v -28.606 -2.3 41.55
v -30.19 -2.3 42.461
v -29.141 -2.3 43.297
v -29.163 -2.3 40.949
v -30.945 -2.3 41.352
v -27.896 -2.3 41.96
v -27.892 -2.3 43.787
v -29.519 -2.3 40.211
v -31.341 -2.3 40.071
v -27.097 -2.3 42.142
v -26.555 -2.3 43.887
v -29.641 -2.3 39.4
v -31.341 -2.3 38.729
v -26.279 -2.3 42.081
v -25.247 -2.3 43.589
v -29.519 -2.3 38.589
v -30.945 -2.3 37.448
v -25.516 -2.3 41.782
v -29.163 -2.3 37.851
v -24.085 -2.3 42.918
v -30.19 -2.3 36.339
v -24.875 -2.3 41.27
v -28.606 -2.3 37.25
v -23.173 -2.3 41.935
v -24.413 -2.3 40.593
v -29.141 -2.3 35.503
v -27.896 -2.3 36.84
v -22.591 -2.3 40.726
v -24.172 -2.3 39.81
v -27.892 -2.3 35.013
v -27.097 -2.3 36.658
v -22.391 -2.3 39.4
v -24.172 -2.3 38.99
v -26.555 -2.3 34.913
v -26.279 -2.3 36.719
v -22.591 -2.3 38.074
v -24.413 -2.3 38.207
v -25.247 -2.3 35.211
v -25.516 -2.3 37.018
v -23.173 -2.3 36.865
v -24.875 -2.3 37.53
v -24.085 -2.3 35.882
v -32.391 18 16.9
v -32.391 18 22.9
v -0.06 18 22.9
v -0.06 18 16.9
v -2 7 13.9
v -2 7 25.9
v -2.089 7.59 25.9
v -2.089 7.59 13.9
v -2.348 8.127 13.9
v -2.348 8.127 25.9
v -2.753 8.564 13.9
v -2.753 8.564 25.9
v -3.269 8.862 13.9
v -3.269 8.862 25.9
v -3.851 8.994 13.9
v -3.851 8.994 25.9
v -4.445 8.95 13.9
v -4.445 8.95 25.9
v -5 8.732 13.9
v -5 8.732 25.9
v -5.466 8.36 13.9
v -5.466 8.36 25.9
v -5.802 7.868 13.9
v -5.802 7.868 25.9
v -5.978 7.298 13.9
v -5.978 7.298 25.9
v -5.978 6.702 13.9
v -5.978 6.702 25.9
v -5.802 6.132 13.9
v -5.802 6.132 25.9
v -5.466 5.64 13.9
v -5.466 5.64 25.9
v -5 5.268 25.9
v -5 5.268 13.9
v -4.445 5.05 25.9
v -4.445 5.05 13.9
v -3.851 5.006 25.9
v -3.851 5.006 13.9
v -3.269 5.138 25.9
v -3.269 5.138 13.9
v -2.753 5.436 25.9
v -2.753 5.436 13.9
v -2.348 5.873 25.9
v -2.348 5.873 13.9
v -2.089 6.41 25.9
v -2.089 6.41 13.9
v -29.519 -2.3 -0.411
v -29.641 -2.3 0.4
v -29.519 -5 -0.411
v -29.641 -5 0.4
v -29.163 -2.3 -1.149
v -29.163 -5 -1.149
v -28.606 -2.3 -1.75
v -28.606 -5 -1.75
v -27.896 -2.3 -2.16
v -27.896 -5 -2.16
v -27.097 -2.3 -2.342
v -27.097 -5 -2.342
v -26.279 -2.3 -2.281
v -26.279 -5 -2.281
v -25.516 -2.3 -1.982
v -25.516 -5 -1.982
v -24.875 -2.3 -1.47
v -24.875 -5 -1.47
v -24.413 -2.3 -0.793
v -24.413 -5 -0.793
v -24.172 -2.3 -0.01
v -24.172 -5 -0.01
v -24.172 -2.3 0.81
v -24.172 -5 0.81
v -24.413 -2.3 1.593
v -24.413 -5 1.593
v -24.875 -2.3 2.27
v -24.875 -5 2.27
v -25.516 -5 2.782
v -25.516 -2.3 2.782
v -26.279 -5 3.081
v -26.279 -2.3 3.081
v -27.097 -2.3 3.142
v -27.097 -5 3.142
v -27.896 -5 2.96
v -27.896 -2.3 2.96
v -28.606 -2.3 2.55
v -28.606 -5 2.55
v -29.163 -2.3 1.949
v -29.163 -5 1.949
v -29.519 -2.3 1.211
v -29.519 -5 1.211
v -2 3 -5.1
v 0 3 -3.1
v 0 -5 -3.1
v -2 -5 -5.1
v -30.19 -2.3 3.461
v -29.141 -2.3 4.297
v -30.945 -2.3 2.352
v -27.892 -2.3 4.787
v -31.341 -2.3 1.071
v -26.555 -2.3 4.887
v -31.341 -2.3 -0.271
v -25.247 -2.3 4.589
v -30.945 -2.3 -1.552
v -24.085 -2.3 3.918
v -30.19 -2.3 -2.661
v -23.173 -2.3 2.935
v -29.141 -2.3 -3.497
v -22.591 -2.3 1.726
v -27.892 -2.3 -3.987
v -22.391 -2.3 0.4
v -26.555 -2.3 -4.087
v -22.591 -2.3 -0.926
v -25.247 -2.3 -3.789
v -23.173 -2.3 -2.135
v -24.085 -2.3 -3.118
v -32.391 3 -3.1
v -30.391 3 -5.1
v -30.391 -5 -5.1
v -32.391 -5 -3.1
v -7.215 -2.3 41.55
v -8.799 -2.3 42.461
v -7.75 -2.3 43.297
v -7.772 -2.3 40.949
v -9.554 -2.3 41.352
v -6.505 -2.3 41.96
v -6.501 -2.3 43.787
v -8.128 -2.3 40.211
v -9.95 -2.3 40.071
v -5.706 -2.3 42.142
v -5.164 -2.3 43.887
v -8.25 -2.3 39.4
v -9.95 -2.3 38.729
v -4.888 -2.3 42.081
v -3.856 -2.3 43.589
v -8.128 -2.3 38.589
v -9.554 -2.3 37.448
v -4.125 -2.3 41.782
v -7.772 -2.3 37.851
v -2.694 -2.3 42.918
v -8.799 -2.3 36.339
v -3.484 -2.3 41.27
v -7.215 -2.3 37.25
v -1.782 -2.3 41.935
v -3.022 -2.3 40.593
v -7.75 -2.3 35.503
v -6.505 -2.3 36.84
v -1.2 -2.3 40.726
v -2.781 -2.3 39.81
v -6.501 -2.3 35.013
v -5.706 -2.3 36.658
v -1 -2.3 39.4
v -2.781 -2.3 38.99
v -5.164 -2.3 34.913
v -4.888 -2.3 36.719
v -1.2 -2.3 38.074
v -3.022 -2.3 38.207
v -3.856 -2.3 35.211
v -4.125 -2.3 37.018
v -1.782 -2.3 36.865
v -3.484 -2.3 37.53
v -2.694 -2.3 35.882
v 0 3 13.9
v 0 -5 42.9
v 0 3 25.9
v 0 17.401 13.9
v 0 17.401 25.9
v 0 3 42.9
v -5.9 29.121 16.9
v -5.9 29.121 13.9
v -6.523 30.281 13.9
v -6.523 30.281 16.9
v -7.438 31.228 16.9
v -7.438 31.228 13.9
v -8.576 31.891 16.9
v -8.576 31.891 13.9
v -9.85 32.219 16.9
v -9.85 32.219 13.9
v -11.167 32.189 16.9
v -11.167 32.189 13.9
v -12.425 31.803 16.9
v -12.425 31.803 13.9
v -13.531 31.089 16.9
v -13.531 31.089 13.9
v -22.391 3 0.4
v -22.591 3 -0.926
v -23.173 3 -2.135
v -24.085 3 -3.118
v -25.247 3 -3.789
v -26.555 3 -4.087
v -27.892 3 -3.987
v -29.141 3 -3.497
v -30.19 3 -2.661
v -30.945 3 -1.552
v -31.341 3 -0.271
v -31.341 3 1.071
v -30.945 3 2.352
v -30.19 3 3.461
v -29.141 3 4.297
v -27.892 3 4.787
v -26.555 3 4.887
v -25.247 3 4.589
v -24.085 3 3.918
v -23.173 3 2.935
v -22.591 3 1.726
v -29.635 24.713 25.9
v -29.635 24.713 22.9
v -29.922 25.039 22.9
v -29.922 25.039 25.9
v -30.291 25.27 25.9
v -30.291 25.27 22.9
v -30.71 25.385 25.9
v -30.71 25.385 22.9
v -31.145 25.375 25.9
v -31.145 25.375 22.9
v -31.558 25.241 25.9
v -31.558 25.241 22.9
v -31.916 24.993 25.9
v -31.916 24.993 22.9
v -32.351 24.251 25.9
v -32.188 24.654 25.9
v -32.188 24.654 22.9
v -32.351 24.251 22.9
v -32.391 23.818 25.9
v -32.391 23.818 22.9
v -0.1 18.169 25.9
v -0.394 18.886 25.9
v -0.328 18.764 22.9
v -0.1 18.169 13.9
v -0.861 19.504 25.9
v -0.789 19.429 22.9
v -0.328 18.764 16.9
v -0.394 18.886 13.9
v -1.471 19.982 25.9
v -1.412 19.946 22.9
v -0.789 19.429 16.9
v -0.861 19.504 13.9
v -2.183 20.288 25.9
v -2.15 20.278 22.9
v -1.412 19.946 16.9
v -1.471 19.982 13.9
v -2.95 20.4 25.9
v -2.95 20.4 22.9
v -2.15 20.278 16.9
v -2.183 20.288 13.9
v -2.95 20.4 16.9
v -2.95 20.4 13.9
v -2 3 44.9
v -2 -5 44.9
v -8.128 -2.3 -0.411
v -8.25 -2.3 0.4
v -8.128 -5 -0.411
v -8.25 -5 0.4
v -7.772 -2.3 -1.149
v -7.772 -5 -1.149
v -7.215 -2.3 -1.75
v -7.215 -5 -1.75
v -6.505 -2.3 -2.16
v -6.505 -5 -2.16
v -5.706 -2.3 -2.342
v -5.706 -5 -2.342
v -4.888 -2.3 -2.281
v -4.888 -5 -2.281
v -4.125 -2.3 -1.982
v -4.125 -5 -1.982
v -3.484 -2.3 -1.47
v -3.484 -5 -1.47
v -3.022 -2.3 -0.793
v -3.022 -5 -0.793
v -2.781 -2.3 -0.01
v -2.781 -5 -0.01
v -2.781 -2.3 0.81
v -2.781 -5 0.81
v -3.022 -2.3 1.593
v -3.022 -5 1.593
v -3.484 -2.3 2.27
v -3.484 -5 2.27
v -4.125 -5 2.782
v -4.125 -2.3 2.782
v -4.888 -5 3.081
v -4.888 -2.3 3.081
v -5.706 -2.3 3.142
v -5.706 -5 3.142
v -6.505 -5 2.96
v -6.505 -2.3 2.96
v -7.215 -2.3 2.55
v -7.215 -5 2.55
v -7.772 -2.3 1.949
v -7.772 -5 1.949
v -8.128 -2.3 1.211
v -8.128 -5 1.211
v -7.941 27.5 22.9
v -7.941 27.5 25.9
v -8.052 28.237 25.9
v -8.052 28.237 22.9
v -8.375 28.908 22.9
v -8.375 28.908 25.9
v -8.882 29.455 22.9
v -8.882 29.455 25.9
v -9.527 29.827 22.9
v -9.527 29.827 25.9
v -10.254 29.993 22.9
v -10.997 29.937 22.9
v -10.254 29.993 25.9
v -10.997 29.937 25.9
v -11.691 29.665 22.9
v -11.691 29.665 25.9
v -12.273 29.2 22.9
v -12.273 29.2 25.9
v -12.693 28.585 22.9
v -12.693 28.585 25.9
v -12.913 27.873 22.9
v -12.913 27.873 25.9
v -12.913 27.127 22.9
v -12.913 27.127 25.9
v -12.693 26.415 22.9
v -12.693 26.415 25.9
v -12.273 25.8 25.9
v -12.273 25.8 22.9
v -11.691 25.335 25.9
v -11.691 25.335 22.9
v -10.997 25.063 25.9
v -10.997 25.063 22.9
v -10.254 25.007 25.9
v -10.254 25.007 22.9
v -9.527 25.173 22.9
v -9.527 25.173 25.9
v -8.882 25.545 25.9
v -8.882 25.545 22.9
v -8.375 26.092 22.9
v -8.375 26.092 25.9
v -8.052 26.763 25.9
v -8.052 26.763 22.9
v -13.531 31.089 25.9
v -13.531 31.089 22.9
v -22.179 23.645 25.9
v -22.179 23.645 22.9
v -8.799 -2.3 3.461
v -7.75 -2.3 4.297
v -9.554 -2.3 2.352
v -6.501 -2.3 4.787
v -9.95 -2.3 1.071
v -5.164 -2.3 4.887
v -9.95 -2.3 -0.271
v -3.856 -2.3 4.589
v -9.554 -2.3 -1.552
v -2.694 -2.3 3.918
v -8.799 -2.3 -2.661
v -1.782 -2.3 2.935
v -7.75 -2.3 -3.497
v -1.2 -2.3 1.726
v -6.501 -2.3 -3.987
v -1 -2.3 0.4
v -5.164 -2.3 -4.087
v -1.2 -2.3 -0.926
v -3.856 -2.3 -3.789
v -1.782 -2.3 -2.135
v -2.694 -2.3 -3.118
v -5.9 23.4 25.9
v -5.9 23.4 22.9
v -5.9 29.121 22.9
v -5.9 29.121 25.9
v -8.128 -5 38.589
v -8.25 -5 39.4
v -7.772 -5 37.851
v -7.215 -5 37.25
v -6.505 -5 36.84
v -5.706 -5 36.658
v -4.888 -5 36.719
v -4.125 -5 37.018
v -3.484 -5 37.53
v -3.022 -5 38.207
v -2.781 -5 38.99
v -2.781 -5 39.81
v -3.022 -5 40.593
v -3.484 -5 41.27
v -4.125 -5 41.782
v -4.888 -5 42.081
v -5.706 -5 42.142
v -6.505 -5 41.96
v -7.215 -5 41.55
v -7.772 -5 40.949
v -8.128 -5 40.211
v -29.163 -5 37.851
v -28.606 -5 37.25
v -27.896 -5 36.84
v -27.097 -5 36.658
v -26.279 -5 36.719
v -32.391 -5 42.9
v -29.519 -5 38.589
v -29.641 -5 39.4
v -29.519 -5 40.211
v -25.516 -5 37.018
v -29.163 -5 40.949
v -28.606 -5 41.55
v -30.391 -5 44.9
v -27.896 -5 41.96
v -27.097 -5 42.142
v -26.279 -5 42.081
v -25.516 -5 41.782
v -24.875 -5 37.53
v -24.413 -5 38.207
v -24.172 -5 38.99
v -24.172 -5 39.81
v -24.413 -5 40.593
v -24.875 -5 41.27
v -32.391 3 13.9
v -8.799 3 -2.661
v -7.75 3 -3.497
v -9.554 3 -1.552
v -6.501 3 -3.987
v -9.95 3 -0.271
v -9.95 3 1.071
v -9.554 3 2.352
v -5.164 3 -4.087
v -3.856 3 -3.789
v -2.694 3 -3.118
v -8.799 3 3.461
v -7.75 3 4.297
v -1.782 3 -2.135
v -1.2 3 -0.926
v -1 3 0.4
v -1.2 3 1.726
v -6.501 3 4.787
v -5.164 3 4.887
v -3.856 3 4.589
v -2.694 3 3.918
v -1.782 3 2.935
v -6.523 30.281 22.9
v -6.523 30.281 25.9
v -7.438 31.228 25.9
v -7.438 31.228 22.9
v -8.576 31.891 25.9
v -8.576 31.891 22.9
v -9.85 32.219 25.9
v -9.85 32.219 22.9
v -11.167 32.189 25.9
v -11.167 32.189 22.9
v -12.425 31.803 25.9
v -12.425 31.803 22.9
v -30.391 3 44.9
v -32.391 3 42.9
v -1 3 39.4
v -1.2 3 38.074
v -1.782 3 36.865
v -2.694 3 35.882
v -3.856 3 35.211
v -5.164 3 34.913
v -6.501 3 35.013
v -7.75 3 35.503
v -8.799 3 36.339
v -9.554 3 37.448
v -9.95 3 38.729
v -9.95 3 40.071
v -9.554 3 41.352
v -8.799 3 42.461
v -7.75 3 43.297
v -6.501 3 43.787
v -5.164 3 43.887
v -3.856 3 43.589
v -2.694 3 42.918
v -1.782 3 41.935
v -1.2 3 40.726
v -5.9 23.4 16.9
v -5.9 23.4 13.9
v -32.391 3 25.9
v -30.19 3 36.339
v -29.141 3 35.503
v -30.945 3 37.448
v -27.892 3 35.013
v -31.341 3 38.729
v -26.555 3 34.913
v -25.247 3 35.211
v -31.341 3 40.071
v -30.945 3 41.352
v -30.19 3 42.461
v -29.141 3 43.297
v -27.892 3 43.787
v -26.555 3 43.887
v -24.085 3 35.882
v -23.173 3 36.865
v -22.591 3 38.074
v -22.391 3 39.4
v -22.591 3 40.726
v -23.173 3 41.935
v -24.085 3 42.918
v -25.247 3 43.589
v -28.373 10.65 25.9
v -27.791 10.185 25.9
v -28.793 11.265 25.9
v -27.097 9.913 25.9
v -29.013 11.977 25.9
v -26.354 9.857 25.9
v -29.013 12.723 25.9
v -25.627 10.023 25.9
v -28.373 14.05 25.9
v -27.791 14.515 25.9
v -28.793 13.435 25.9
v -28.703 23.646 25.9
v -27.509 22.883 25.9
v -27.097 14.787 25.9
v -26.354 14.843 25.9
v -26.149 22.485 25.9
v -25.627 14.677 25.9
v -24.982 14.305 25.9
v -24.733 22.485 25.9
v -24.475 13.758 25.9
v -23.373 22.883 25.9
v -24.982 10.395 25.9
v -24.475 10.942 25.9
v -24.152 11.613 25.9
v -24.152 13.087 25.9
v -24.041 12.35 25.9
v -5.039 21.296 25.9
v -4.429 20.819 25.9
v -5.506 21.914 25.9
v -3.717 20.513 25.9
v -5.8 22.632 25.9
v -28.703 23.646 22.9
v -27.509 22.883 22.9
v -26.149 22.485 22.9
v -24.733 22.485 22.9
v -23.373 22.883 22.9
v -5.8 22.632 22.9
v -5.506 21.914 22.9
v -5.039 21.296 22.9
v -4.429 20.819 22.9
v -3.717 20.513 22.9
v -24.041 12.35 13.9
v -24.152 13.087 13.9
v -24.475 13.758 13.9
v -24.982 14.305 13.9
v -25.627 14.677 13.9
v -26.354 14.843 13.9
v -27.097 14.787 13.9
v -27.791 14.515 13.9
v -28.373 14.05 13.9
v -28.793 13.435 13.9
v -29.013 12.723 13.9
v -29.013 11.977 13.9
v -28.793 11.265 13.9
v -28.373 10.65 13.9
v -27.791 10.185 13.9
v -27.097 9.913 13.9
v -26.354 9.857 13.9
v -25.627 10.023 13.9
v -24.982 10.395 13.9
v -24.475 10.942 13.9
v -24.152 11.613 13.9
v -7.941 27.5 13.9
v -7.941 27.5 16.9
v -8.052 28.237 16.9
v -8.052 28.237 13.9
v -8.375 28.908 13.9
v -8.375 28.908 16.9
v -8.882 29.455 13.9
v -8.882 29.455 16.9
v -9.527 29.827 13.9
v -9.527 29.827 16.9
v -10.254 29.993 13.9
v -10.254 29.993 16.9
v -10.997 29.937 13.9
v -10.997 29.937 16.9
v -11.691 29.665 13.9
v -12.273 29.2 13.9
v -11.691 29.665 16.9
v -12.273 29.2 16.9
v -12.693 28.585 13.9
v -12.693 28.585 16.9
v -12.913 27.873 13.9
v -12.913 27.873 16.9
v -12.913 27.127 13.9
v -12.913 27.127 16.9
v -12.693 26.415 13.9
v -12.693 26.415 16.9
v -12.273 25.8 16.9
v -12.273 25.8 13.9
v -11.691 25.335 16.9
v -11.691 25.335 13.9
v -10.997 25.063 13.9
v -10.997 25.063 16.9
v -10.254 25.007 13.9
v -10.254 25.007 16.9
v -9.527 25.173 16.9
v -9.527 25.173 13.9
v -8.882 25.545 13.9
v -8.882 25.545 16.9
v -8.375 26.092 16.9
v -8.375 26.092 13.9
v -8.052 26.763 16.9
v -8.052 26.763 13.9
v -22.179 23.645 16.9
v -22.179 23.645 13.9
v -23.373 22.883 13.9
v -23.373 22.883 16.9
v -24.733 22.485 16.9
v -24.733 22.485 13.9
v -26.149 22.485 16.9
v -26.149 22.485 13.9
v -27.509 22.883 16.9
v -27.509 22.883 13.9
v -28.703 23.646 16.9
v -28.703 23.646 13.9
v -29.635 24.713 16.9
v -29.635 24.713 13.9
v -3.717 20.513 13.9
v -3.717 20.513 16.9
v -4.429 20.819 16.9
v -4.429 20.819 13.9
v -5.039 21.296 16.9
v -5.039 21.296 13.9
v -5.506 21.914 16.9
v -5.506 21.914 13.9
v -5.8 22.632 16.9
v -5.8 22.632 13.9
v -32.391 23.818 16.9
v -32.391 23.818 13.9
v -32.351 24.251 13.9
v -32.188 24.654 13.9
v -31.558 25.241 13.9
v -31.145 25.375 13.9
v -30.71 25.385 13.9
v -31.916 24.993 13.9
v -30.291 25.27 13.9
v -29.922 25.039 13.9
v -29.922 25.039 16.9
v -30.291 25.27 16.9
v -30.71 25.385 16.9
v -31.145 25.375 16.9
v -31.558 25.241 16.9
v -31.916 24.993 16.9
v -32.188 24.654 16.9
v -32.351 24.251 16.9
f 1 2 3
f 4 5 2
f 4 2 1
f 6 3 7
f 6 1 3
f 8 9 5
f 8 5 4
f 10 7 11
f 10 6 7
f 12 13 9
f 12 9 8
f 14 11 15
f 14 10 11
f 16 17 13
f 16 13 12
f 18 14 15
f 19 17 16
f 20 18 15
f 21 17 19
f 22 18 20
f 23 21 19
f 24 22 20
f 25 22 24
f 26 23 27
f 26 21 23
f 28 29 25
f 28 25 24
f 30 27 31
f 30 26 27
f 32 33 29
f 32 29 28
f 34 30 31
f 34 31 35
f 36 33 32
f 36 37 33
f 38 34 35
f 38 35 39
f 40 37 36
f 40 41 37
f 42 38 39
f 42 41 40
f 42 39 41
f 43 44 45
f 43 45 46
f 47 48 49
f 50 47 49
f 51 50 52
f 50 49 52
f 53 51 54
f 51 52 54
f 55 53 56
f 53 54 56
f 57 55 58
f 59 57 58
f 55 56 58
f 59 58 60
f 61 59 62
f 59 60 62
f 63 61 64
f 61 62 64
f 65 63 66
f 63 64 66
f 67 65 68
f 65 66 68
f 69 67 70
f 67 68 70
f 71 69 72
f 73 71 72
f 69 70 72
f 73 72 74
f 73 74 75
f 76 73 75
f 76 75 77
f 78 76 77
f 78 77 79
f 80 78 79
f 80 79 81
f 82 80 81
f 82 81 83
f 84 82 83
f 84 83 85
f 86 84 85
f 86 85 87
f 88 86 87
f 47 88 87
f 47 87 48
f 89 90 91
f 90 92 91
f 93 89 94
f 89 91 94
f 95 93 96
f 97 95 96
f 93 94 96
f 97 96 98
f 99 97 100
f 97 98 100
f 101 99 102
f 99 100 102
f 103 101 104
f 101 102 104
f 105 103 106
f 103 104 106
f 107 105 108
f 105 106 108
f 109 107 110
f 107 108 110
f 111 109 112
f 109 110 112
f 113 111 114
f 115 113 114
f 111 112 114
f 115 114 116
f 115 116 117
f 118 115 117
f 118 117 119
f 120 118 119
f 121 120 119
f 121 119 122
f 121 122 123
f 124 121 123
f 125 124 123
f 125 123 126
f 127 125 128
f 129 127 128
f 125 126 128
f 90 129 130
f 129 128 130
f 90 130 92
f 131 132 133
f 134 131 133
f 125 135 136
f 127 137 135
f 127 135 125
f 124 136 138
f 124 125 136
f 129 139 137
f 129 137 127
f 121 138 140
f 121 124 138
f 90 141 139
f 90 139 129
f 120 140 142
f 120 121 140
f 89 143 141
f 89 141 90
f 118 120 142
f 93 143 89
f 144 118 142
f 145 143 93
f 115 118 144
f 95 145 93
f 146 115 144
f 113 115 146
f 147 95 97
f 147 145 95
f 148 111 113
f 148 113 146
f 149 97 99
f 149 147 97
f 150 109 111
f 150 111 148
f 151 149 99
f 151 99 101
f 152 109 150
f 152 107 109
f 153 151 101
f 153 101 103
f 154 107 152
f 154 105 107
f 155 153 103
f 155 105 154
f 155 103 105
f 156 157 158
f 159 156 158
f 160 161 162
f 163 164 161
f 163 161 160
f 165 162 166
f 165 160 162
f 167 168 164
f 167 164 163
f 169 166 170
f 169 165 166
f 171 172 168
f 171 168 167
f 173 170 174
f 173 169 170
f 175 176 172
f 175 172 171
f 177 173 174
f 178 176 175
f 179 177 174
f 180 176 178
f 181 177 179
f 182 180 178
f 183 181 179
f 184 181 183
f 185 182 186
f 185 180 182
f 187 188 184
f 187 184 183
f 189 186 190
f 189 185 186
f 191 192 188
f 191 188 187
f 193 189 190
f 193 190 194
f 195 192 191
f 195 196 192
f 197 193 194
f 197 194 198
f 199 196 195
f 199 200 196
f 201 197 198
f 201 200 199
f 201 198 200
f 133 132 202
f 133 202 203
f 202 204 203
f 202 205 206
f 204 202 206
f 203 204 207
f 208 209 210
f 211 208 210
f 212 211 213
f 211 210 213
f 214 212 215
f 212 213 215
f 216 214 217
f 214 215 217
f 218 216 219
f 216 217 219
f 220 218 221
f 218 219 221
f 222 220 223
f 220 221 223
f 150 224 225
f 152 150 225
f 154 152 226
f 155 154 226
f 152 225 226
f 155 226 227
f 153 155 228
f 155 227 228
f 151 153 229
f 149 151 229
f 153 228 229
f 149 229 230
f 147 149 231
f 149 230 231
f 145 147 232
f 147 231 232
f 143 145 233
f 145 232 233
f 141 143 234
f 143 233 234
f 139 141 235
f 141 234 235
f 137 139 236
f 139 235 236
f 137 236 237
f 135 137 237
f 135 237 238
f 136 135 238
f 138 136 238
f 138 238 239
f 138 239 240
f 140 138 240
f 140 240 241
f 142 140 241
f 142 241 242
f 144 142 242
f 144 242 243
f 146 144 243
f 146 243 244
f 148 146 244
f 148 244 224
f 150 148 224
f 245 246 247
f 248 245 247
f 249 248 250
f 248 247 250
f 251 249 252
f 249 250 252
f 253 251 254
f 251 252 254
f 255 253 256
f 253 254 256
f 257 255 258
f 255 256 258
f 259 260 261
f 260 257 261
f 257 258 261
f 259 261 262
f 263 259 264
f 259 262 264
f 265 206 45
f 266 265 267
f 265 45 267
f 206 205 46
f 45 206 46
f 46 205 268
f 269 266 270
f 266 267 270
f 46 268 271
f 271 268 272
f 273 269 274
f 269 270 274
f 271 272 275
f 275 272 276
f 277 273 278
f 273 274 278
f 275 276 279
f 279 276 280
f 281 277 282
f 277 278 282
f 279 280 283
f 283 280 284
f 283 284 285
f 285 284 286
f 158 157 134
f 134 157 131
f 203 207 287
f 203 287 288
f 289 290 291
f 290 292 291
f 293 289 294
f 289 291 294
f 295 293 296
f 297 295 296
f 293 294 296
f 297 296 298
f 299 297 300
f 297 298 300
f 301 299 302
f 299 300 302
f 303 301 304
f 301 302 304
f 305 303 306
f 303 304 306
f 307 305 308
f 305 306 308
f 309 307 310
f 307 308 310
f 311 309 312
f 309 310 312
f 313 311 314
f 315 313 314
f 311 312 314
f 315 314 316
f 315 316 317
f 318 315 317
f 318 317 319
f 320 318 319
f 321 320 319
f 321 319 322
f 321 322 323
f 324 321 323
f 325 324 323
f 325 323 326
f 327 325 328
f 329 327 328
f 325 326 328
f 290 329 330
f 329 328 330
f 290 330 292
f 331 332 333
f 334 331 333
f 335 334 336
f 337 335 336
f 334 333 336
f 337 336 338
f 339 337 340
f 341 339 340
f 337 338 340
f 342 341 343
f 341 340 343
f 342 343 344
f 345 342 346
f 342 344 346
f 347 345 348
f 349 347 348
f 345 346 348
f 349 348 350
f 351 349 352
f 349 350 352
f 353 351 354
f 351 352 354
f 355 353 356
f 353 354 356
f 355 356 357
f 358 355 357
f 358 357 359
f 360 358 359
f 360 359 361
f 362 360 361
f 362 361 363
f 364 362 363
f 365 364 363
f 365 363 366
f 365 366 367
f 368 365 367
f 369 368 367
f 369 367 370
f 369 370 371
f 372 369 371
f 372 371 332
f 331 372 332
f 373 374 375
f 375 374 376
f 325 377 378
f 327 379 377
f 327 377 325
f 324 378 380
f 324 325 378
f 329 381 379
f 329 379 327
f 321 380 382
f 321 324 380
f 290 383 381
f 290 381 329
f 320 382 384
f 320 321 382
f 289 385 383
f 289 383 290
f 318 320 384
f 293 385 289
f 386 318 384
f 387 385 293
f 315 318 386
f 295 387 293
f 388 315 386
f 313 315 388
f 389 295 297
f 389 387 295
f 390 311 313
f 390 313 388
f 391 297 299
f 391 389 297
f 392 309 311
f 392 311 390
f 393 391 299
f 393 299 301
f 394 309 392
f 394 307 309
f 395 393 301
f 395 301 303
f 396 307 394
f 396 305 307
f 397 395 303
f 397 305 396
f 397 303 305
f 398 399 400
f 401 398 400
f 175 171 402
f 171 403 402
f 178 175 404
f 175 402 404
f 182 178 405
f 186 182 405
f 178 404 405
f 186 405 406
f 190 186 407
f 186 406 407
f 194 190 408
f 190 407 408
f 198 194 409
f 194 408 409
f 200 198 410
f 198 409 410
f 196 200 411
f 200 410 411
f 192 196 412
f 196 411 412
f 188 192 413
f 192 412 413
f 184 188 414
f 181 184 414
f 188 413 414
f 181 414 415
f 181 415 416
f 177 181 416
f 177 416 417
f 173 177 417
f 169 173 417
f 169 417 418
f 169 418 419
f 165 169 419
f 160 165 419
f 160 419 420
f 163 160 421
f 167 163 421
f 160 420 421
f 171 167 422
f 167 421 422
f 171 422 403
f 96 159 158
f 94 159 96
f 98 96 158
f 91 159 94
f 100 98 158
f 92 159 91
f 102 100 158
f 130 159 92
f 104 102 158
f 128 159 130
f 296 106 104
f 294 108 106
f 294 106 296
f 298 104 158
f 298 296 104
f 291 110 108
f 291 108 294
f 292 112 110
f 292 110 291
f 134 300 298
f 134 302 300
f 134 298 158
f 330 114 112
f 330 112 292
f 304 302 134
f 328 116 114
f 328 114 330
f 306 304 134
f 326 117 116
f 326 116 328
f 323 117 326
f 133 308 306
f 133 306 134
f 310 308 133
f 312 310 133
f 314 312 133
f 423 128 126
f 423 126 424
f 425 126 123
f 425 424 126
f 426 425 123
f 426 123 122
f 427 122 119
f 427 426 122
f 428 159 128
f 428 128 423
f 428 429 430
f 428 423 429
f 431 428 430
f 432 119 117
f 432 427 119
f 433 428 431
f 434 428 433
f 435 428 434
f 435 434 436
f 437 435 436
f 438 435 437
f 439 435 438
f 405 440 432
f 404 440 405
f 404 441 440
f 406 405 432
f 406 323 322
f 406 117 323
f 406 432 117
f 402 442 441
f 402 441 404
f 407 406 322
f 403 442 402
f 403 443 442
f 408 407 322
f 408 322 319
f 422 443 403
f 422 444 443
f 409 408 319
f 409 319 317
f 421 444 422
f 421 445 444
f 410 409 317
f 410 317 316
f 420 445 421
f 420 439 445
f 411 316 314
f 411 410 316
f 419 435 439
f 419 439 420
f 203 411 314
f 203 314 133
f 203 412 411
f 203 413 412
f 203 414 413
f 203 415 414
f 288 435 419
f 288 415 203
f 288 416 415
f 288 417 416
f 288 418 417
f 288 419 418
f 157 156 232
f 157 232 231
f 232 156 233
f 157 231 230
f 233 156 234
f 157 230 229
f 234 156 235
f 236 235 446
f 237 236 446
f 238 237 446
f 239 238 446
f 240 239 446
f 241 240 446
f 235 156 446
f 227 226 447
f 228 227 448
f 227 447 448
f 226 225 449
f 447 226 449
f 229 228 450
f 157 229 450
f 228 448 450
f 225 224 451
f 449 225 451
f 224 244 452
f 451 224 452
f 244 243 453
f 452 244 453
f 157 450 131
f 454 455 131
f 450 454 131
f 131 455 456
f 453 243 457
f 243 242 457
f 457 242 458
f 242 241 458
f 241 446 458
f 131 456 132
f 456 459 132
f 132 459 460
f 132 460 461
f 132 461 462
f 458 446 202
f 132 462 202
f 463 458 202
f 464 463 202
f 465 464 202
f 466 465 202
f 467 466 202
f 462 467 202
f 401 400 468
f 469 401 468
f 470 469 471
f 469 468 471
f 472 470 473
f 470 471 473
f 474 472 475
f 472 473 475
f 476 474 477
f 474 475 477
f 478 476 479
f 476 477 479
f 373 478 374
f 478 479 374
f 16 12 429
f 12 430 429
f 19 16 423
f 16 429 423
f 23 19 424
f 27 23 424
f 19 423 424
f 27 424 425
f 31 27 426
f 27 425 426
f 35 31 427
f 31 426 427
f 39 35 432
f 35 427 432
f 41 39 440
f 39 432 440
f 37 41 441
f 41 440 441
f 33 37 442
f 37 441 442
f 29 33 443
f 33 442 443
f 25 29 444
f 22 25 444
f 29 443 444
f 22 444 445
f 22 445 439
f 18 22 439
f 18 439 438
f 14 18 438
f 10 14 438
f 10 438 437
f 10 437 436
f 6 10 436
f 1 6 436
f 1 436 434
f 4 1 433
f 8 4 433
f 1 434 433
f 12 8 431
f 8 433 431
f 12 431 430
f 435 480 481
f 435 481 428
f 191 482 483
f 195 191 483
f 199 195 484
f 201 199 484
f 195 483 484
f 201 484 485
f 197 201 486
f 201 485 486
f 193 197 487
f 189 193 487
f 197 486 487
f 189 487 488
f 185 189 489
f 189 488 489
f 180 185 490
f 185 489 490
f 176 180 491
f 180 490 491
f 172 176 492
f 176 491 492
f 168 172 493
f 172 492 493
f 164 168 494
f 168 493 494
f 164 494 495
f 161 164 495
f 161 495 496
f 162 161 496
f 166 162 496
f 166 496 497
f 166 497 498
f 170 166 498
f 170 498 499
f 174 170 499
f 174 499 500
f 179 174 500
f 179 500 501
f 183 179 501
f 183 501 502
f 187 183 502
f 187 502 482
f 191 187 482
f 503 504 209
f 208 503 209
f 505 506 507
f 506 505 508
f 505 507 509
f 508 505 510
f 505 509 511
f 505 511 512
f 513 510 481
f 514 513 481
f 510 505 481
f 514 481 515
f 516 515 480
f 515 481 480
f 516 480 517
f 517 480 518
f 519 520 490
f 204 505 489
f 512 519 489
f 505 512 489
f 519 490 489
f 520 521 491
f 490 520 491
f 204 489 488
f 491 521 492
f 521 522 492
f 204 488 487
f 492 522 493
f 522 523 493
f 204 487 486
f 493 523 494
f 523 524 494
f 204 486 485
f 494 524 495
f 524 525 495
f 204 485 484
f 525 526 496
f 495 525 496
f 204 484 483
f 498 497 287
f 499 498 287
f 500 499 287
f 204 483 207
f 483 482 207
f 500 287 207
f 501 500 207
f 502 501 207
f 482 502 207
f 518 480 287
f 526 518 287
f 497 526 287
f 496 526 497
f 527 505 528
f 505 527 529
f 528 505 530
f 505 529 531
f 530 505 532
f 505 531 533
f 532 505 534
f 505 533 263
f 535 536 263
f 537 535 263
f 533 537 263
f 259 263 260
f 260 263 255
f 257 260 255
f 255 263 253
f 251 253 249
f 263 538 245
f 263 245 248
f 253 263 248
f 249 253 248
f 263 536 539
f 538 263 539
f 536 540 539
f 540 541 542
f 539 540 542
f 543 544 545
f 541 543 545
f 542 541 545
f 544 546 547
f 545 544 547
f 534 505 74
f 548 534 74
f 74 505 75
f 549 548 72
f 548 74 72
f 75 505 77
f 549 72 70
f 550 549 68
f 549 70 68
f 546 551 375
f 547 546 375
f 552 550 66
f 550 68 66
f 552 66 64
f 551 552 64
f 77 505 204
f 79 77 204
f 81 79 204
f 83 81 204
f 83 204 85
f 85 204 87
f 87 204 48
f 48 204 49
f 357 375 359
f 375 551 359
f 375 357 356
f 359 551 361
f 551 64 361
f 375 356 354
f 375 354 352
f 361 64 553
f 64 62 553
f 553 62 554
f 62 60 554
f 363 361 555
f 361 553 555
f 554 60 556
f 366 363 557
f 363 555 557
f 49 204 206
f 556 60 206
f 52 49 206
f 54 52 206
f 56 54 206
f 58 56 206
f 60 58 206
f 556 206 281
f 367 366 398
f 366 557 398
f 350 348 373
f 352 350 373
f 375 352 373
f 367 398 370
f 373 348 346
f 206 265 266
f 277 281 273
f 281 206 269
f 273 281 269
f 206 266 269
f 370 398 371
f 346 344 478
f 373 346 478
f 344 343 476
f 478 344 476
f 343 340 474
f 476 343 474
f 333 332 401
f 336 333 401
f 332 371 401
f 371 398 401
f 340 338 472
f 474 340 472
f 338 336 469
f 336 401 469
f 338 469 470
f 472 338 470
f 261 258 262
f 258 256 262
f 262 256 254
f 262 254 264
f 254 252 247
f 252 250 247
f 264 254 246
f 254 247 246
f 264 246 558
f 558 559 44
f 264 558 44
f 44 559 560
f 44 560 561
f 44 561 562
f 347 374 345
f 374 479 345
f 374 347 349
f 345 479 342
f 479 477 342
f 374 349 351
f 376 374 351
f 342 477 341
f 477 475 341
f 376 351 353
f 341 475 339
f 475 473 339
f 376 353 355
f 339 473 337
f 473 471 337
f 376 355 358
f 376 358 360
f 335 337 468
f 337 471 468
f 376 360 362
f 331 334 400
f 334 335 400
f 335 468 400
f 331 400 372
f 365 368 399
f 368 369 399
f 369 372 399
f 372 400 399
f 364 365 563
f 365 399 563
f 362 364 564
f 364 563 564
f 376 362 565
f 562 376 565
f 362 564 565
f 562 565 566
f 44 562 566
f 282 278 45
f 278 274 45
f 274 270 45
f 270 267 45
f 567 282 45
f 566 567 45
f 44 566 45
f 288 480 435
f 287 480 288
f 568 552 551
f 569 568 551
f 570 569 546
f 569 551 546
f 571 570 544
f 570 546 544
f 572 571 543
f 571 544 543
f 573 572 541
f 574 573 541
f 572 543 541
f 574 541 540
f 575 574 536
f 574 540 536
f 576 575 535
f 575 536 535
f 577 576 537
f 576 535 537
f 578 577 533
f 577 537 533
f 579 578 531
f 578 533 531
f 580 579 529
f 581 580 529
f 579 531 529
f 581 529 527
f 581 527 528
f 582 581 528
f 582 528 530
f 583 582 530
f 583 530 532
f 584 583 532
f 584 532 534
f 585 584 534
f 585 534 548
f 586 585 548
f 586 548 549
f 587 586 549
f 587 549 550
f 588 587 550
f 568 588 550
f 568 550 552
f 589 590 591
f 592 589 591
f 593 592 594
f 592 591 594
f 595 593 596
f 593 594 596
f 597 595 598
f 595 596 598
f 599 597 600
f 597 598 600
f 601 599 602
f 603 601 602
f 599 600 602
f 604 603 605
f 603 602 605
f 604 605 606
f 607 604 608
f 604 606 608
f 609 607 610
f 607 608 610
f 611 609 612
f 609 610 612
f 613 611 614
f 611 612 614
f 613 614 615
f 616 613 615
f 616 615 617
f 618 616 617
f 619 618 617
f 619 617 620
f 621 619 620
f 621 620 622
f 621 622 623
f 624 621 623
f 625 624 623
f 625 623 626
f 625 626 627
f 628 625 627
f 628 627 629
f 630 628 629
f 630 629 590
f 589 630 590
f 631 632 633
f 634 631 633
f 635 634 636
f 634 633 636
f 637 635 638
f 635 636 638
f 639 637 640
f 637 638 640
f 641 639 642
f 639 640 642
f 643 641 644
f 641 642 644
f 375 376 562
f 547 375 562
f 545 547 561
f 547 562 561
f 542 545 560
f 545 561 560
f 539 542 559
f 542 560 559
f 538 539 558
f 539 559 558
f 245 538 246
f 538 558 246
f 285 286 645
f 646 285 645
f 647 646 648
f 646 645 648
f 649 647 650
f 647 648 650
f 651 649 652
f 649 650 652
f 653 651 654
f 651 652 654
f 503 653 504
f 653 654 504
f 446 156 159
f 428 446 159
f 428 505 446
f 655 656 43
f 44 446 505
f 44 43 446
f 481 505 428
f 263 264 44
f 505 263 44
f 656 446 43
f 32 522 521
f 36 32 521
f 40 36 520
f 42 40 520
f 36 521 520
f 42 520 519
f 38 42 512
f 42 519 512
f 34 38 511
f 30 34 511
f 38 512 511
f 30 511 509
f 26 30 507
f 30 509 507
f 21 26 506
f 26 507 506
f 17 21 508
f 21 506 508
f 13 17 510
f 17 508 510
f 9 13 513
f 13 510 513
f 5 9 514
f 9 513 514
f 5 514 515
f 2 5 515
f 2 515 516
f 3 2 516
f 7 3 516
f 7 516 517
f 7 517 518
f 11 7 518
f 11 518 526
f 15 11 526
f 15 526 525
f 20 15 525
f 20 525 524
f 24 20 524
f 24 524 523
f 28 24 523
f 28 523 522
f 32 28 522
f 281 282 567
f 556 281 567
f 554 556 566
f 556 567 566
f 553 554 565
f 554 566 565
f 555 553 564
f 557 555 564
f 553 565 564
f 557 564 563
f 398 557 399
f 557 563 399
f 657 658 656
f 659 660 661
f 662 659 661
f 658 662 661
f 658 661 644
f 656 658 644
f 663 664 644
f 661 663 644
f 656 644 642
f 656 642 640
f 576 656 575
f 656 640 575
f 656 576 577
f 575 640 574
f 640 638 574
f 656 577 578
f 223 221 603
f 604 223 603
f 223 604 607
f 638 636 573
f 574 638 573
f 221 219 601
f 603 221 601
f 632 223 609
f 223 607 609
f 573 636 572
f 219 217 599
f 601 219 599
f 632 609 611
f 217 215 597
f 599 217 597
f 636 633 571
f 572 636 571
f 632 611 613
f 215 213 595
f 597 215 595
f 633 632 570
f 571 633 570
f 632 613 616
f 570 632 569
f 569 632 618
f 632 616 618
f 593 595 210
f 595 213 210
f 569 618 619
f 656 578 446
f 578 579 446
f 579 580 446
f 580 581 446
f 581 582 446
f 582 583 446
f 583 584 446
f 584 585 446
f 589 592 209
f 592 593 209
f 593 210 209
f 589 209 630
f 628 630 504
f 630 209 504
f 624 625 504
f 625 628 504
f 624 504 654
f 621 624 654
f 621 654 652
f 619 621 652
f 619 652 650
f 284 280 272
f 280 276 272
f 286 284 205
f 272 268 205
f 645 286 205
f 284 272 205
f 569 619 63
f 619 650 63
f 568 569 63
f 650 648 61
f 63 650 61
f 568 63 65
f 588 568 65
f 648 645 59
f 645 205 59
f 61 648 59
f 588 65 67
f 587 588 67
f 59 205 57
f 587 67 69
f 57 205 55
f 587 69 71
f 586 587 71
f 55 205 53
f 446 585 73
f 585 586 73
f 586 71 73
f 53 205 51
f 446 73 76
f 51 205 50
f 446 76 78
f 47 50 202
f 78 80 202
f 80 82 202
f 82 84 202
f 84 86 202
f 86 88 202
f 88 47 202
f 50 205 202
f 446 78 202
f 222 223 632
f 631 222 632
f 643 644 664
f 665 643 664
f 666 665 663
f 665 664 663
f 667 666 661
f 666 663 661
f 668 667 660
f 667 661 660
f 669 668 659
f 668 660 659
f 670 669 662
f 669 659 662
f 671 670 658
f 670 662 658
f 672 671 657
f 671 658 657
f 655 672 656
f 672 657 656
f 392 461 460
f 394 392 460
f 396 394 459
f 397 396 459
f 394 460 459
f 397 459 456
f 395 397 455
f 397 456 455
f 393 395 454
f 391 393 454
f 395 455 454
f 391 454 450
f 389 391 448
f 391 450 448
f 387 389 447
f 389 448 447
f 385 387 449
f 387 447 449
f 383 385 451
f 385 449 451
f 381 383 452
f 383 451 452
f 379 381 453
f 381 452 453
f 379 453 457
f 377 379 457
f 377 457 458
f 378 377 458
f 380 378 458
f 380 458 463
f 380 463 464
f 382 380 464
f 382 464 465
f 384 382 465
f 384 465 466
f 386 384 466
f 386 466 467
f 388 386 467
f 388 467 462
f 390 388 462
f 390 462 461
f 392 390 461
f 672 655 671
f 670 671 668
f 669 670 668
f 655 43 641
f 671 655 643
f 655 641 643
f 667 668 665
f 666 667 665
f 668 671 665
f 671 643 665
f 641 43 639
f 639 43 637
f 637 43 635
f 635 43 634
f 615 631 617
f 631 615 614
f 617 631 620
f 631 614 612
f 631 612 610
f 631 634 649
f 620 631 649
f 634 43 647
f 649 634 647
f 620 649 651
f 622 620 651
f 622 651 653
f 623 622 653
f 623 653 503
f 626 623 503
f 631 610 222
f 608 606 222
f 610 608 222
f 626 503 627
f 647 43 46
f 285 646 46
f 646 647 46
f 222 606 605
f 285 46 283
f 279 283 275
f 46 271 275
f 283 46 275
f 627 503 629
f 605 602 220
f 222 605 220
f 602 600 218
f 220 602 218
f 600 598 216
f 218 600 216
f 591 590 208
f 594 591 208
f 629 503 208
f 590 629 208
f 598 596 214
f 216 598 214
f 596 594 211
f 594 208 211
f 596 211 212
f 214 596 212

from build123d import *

# Parameters (mm, degrees)
EXTRUDE_1_DEPTH              = 35
SKETCH_2_W                   = 82.468710257
SKETCH_2_H                   = 88.660900106
CUT_EXTRUDE_1_DEPTH          = 40
SKETCH_10_R                  = 2.5
CUT_EXTRUDE_6_DEPTH          = 48.259263975
SKETCH_11_R                  = 2.5
CUT_EXTRUDE_7_DEPTH          = 48.259263975
SKETCH_13_R                  = 2
CUT_EXTRUDE_8_DEPTH          = 48.259263975
FILLET_1_R                   = 3
SKETCH_14_W                  = 32.391015019
SKETCH_14_H                  = 50
EXTRUDE_2_DEPTH              = 8
CHAMFER_1_SIZE               = 2
HOLE_WIZARD_M5_1_D           = 5.5
HOLE_WIZARD_M5_1_CBORE_D     = 9
HOLE_WIZARD_M5_1_CBORE_DEPTH = 5.3


with BuildPart() as part:
    # 草圖1 → 填料-伸長1 (new body)
    with BuildSketch(Plane(origin=(0, 0, 0), x_dir=(0, 0, -1), z_dir=(1, 0, 0))):
        Polygon((-13.9, 3), (-25.9, 3), (-25.9, 38), (-22.9, 38), (-22.9, 18), (-16.9, 18), (-16.9, 38), (-13.9, 38), align=None)
    extrude(amount=-EXTRUDE_1_DEPTH)

    # 草圖2 → 除料-伸長1 (cut)
    with BuildSketch(Plane.XY.offset(13.9)):
        with Locations((-13.573394444, 11.892084287)):
            Rectangle(SKETCH_2_W, SKETCH_2_H)
        with BuildLine():
            Line((-32.391015019, 23.817806702), (-32.391015019, 3))
            Line((-32.391015019, 3), (0, 3))
            Line((0, 3), (0, 20.4))
            Line((0, 20.4), (-2.9, 20.4))
            ThreePointArc((-2.9, 20.4), (-5.021320344, 21.278679656), (-5.9, 23.4))
            Line((-5.9, 23.4), (-5.9, 29.121329309))
            ThreePointArc((-5.9, 29.121329309), (-9.201633351, 32.099001439), (-13.531412968, 31.088891261))
            Line((-13.531412968, 31.088891261), (-22.178800852, 23.645419036))
            ThreePointArc((-22.178800852, 23.645419036), (-26.149318252, 22.485359315), (-29.634828865, 24.712905667))
            ThreePointArc((-29.634828865, 24.712905667), (-31.356390105, 25.322962362), (-32.391015019, 23.817806702))
        make_face(mode=Mode.SUBTRACT)
    extrude(amount=CUT_EXTRUDE_1_DEPTH, mode=Mode.SUBTRACT)

    # 草圖10 → 除料-伸長6 (cut, through all)
    with BuildSketch(Plane.XY.offset(25.9)):
        with Locations((-10.44068936, 27.5)):
            Circle(SKETCH_10_R)
    extrude(amount=-CUT_EXTRUDE_6_DEPTH, mode=Mode.SUBTRACT)

    # 草圖11 → 除料-伸長7 (cut, through all)
    with BuildSketch(Plane.XY.offset(25.9)):
        with Locations((-26.54068936, 12.35)):
            Circle(SKETCH_11_R)
    extrude(amount=-CUT_EXTRUDE_7_DEPTH, mode=Mode.SUBTRACT)

    # 草圖13 → 除料-伸長8 (cut, through all)
    with BuildSketch(Plane.XY.offset(25.9)):
        with Locations((-4, 7)):
            Circle(SKETCH_13_R)
    extrude(amount=-CUT_EXTRUDE_8_DEPTH, mode=Mode.SUBTRACT)

    # 圓角1
    # the kernel refuses this fillet: 3 mm, written as the material it takes off along each edge
    with BuildSketch(Plane(origin=(0, 20.4, 15.402083478), x_dir=(0, -1, 0), z_dir=(0, 0, 1)), Plane(origin=(0, 20.4, 6.402083478), x_dir=(0, -1, 0), z_dir=(0, 0, 1))) as fillet_1_piece_1:
        with BuildLine():
            CenterArc((2.999166609, -3), FILLET_1_R, 90, 89.045026126)
            Line((-0.000416696, -2.95), (-0.300375026, -2.945))
            ThreePointArc((-0.300375026, -2.945), (-0.3, -2.9), (-0.3, 0))
            Line((-0.3, 0), (0, 0.3))
            Line((0, 0.3), (2.999166609, 0.3))
            Line((2.999166609, 0.3), (2.999166609, 0))
        make_face()
    extrude(amount=17.995833044, mode=Mode.SUBTRACT)

    # 草圖14 → 填料-伸長2 (add)
    with BuildSketch(Plane.XZ.offset(-3)):
        with Locations((-16.19550751, 19.9)):
            Rectangle(SKETCH_14_W, SKETCH_14_H)
    extrude(amount=EXTRUDE_2_DEPTH)

    # 導角1
    chamfer_1_edges = [part.edges().sort_by_distance(p)[0] for p in [
        (-32.391015019, -1, -5.1),
        (0, -1, -5.1),
        (-32.391015019, -1, 44.9),
        (0, -1, 44.9),
    ]]
    chamfer(chamfer_1_edges, length=CHAMFER_1_SIZE)

    # M5 內六角圓柱頭螺釘的柱孔1 (through all)
    with Locations(Plane(origin=(0, 3, 0), x_dir=(1, 0, 0), z_dir=(0, 1, 0))):
        with Locations((-26.891015019, -0.4), (-5.5, -0.4), (-5.5, -39.4), (-26.891015019, -39.4)):
            CounterBoreHole(HOLE_WIZARD_M5_1_D / 2, HOLE_WIZARD_M5_1_CBORE_D / 2, HOLE_WIZARD_M5_1_CBORE_DEPTH)


solid = part.part
